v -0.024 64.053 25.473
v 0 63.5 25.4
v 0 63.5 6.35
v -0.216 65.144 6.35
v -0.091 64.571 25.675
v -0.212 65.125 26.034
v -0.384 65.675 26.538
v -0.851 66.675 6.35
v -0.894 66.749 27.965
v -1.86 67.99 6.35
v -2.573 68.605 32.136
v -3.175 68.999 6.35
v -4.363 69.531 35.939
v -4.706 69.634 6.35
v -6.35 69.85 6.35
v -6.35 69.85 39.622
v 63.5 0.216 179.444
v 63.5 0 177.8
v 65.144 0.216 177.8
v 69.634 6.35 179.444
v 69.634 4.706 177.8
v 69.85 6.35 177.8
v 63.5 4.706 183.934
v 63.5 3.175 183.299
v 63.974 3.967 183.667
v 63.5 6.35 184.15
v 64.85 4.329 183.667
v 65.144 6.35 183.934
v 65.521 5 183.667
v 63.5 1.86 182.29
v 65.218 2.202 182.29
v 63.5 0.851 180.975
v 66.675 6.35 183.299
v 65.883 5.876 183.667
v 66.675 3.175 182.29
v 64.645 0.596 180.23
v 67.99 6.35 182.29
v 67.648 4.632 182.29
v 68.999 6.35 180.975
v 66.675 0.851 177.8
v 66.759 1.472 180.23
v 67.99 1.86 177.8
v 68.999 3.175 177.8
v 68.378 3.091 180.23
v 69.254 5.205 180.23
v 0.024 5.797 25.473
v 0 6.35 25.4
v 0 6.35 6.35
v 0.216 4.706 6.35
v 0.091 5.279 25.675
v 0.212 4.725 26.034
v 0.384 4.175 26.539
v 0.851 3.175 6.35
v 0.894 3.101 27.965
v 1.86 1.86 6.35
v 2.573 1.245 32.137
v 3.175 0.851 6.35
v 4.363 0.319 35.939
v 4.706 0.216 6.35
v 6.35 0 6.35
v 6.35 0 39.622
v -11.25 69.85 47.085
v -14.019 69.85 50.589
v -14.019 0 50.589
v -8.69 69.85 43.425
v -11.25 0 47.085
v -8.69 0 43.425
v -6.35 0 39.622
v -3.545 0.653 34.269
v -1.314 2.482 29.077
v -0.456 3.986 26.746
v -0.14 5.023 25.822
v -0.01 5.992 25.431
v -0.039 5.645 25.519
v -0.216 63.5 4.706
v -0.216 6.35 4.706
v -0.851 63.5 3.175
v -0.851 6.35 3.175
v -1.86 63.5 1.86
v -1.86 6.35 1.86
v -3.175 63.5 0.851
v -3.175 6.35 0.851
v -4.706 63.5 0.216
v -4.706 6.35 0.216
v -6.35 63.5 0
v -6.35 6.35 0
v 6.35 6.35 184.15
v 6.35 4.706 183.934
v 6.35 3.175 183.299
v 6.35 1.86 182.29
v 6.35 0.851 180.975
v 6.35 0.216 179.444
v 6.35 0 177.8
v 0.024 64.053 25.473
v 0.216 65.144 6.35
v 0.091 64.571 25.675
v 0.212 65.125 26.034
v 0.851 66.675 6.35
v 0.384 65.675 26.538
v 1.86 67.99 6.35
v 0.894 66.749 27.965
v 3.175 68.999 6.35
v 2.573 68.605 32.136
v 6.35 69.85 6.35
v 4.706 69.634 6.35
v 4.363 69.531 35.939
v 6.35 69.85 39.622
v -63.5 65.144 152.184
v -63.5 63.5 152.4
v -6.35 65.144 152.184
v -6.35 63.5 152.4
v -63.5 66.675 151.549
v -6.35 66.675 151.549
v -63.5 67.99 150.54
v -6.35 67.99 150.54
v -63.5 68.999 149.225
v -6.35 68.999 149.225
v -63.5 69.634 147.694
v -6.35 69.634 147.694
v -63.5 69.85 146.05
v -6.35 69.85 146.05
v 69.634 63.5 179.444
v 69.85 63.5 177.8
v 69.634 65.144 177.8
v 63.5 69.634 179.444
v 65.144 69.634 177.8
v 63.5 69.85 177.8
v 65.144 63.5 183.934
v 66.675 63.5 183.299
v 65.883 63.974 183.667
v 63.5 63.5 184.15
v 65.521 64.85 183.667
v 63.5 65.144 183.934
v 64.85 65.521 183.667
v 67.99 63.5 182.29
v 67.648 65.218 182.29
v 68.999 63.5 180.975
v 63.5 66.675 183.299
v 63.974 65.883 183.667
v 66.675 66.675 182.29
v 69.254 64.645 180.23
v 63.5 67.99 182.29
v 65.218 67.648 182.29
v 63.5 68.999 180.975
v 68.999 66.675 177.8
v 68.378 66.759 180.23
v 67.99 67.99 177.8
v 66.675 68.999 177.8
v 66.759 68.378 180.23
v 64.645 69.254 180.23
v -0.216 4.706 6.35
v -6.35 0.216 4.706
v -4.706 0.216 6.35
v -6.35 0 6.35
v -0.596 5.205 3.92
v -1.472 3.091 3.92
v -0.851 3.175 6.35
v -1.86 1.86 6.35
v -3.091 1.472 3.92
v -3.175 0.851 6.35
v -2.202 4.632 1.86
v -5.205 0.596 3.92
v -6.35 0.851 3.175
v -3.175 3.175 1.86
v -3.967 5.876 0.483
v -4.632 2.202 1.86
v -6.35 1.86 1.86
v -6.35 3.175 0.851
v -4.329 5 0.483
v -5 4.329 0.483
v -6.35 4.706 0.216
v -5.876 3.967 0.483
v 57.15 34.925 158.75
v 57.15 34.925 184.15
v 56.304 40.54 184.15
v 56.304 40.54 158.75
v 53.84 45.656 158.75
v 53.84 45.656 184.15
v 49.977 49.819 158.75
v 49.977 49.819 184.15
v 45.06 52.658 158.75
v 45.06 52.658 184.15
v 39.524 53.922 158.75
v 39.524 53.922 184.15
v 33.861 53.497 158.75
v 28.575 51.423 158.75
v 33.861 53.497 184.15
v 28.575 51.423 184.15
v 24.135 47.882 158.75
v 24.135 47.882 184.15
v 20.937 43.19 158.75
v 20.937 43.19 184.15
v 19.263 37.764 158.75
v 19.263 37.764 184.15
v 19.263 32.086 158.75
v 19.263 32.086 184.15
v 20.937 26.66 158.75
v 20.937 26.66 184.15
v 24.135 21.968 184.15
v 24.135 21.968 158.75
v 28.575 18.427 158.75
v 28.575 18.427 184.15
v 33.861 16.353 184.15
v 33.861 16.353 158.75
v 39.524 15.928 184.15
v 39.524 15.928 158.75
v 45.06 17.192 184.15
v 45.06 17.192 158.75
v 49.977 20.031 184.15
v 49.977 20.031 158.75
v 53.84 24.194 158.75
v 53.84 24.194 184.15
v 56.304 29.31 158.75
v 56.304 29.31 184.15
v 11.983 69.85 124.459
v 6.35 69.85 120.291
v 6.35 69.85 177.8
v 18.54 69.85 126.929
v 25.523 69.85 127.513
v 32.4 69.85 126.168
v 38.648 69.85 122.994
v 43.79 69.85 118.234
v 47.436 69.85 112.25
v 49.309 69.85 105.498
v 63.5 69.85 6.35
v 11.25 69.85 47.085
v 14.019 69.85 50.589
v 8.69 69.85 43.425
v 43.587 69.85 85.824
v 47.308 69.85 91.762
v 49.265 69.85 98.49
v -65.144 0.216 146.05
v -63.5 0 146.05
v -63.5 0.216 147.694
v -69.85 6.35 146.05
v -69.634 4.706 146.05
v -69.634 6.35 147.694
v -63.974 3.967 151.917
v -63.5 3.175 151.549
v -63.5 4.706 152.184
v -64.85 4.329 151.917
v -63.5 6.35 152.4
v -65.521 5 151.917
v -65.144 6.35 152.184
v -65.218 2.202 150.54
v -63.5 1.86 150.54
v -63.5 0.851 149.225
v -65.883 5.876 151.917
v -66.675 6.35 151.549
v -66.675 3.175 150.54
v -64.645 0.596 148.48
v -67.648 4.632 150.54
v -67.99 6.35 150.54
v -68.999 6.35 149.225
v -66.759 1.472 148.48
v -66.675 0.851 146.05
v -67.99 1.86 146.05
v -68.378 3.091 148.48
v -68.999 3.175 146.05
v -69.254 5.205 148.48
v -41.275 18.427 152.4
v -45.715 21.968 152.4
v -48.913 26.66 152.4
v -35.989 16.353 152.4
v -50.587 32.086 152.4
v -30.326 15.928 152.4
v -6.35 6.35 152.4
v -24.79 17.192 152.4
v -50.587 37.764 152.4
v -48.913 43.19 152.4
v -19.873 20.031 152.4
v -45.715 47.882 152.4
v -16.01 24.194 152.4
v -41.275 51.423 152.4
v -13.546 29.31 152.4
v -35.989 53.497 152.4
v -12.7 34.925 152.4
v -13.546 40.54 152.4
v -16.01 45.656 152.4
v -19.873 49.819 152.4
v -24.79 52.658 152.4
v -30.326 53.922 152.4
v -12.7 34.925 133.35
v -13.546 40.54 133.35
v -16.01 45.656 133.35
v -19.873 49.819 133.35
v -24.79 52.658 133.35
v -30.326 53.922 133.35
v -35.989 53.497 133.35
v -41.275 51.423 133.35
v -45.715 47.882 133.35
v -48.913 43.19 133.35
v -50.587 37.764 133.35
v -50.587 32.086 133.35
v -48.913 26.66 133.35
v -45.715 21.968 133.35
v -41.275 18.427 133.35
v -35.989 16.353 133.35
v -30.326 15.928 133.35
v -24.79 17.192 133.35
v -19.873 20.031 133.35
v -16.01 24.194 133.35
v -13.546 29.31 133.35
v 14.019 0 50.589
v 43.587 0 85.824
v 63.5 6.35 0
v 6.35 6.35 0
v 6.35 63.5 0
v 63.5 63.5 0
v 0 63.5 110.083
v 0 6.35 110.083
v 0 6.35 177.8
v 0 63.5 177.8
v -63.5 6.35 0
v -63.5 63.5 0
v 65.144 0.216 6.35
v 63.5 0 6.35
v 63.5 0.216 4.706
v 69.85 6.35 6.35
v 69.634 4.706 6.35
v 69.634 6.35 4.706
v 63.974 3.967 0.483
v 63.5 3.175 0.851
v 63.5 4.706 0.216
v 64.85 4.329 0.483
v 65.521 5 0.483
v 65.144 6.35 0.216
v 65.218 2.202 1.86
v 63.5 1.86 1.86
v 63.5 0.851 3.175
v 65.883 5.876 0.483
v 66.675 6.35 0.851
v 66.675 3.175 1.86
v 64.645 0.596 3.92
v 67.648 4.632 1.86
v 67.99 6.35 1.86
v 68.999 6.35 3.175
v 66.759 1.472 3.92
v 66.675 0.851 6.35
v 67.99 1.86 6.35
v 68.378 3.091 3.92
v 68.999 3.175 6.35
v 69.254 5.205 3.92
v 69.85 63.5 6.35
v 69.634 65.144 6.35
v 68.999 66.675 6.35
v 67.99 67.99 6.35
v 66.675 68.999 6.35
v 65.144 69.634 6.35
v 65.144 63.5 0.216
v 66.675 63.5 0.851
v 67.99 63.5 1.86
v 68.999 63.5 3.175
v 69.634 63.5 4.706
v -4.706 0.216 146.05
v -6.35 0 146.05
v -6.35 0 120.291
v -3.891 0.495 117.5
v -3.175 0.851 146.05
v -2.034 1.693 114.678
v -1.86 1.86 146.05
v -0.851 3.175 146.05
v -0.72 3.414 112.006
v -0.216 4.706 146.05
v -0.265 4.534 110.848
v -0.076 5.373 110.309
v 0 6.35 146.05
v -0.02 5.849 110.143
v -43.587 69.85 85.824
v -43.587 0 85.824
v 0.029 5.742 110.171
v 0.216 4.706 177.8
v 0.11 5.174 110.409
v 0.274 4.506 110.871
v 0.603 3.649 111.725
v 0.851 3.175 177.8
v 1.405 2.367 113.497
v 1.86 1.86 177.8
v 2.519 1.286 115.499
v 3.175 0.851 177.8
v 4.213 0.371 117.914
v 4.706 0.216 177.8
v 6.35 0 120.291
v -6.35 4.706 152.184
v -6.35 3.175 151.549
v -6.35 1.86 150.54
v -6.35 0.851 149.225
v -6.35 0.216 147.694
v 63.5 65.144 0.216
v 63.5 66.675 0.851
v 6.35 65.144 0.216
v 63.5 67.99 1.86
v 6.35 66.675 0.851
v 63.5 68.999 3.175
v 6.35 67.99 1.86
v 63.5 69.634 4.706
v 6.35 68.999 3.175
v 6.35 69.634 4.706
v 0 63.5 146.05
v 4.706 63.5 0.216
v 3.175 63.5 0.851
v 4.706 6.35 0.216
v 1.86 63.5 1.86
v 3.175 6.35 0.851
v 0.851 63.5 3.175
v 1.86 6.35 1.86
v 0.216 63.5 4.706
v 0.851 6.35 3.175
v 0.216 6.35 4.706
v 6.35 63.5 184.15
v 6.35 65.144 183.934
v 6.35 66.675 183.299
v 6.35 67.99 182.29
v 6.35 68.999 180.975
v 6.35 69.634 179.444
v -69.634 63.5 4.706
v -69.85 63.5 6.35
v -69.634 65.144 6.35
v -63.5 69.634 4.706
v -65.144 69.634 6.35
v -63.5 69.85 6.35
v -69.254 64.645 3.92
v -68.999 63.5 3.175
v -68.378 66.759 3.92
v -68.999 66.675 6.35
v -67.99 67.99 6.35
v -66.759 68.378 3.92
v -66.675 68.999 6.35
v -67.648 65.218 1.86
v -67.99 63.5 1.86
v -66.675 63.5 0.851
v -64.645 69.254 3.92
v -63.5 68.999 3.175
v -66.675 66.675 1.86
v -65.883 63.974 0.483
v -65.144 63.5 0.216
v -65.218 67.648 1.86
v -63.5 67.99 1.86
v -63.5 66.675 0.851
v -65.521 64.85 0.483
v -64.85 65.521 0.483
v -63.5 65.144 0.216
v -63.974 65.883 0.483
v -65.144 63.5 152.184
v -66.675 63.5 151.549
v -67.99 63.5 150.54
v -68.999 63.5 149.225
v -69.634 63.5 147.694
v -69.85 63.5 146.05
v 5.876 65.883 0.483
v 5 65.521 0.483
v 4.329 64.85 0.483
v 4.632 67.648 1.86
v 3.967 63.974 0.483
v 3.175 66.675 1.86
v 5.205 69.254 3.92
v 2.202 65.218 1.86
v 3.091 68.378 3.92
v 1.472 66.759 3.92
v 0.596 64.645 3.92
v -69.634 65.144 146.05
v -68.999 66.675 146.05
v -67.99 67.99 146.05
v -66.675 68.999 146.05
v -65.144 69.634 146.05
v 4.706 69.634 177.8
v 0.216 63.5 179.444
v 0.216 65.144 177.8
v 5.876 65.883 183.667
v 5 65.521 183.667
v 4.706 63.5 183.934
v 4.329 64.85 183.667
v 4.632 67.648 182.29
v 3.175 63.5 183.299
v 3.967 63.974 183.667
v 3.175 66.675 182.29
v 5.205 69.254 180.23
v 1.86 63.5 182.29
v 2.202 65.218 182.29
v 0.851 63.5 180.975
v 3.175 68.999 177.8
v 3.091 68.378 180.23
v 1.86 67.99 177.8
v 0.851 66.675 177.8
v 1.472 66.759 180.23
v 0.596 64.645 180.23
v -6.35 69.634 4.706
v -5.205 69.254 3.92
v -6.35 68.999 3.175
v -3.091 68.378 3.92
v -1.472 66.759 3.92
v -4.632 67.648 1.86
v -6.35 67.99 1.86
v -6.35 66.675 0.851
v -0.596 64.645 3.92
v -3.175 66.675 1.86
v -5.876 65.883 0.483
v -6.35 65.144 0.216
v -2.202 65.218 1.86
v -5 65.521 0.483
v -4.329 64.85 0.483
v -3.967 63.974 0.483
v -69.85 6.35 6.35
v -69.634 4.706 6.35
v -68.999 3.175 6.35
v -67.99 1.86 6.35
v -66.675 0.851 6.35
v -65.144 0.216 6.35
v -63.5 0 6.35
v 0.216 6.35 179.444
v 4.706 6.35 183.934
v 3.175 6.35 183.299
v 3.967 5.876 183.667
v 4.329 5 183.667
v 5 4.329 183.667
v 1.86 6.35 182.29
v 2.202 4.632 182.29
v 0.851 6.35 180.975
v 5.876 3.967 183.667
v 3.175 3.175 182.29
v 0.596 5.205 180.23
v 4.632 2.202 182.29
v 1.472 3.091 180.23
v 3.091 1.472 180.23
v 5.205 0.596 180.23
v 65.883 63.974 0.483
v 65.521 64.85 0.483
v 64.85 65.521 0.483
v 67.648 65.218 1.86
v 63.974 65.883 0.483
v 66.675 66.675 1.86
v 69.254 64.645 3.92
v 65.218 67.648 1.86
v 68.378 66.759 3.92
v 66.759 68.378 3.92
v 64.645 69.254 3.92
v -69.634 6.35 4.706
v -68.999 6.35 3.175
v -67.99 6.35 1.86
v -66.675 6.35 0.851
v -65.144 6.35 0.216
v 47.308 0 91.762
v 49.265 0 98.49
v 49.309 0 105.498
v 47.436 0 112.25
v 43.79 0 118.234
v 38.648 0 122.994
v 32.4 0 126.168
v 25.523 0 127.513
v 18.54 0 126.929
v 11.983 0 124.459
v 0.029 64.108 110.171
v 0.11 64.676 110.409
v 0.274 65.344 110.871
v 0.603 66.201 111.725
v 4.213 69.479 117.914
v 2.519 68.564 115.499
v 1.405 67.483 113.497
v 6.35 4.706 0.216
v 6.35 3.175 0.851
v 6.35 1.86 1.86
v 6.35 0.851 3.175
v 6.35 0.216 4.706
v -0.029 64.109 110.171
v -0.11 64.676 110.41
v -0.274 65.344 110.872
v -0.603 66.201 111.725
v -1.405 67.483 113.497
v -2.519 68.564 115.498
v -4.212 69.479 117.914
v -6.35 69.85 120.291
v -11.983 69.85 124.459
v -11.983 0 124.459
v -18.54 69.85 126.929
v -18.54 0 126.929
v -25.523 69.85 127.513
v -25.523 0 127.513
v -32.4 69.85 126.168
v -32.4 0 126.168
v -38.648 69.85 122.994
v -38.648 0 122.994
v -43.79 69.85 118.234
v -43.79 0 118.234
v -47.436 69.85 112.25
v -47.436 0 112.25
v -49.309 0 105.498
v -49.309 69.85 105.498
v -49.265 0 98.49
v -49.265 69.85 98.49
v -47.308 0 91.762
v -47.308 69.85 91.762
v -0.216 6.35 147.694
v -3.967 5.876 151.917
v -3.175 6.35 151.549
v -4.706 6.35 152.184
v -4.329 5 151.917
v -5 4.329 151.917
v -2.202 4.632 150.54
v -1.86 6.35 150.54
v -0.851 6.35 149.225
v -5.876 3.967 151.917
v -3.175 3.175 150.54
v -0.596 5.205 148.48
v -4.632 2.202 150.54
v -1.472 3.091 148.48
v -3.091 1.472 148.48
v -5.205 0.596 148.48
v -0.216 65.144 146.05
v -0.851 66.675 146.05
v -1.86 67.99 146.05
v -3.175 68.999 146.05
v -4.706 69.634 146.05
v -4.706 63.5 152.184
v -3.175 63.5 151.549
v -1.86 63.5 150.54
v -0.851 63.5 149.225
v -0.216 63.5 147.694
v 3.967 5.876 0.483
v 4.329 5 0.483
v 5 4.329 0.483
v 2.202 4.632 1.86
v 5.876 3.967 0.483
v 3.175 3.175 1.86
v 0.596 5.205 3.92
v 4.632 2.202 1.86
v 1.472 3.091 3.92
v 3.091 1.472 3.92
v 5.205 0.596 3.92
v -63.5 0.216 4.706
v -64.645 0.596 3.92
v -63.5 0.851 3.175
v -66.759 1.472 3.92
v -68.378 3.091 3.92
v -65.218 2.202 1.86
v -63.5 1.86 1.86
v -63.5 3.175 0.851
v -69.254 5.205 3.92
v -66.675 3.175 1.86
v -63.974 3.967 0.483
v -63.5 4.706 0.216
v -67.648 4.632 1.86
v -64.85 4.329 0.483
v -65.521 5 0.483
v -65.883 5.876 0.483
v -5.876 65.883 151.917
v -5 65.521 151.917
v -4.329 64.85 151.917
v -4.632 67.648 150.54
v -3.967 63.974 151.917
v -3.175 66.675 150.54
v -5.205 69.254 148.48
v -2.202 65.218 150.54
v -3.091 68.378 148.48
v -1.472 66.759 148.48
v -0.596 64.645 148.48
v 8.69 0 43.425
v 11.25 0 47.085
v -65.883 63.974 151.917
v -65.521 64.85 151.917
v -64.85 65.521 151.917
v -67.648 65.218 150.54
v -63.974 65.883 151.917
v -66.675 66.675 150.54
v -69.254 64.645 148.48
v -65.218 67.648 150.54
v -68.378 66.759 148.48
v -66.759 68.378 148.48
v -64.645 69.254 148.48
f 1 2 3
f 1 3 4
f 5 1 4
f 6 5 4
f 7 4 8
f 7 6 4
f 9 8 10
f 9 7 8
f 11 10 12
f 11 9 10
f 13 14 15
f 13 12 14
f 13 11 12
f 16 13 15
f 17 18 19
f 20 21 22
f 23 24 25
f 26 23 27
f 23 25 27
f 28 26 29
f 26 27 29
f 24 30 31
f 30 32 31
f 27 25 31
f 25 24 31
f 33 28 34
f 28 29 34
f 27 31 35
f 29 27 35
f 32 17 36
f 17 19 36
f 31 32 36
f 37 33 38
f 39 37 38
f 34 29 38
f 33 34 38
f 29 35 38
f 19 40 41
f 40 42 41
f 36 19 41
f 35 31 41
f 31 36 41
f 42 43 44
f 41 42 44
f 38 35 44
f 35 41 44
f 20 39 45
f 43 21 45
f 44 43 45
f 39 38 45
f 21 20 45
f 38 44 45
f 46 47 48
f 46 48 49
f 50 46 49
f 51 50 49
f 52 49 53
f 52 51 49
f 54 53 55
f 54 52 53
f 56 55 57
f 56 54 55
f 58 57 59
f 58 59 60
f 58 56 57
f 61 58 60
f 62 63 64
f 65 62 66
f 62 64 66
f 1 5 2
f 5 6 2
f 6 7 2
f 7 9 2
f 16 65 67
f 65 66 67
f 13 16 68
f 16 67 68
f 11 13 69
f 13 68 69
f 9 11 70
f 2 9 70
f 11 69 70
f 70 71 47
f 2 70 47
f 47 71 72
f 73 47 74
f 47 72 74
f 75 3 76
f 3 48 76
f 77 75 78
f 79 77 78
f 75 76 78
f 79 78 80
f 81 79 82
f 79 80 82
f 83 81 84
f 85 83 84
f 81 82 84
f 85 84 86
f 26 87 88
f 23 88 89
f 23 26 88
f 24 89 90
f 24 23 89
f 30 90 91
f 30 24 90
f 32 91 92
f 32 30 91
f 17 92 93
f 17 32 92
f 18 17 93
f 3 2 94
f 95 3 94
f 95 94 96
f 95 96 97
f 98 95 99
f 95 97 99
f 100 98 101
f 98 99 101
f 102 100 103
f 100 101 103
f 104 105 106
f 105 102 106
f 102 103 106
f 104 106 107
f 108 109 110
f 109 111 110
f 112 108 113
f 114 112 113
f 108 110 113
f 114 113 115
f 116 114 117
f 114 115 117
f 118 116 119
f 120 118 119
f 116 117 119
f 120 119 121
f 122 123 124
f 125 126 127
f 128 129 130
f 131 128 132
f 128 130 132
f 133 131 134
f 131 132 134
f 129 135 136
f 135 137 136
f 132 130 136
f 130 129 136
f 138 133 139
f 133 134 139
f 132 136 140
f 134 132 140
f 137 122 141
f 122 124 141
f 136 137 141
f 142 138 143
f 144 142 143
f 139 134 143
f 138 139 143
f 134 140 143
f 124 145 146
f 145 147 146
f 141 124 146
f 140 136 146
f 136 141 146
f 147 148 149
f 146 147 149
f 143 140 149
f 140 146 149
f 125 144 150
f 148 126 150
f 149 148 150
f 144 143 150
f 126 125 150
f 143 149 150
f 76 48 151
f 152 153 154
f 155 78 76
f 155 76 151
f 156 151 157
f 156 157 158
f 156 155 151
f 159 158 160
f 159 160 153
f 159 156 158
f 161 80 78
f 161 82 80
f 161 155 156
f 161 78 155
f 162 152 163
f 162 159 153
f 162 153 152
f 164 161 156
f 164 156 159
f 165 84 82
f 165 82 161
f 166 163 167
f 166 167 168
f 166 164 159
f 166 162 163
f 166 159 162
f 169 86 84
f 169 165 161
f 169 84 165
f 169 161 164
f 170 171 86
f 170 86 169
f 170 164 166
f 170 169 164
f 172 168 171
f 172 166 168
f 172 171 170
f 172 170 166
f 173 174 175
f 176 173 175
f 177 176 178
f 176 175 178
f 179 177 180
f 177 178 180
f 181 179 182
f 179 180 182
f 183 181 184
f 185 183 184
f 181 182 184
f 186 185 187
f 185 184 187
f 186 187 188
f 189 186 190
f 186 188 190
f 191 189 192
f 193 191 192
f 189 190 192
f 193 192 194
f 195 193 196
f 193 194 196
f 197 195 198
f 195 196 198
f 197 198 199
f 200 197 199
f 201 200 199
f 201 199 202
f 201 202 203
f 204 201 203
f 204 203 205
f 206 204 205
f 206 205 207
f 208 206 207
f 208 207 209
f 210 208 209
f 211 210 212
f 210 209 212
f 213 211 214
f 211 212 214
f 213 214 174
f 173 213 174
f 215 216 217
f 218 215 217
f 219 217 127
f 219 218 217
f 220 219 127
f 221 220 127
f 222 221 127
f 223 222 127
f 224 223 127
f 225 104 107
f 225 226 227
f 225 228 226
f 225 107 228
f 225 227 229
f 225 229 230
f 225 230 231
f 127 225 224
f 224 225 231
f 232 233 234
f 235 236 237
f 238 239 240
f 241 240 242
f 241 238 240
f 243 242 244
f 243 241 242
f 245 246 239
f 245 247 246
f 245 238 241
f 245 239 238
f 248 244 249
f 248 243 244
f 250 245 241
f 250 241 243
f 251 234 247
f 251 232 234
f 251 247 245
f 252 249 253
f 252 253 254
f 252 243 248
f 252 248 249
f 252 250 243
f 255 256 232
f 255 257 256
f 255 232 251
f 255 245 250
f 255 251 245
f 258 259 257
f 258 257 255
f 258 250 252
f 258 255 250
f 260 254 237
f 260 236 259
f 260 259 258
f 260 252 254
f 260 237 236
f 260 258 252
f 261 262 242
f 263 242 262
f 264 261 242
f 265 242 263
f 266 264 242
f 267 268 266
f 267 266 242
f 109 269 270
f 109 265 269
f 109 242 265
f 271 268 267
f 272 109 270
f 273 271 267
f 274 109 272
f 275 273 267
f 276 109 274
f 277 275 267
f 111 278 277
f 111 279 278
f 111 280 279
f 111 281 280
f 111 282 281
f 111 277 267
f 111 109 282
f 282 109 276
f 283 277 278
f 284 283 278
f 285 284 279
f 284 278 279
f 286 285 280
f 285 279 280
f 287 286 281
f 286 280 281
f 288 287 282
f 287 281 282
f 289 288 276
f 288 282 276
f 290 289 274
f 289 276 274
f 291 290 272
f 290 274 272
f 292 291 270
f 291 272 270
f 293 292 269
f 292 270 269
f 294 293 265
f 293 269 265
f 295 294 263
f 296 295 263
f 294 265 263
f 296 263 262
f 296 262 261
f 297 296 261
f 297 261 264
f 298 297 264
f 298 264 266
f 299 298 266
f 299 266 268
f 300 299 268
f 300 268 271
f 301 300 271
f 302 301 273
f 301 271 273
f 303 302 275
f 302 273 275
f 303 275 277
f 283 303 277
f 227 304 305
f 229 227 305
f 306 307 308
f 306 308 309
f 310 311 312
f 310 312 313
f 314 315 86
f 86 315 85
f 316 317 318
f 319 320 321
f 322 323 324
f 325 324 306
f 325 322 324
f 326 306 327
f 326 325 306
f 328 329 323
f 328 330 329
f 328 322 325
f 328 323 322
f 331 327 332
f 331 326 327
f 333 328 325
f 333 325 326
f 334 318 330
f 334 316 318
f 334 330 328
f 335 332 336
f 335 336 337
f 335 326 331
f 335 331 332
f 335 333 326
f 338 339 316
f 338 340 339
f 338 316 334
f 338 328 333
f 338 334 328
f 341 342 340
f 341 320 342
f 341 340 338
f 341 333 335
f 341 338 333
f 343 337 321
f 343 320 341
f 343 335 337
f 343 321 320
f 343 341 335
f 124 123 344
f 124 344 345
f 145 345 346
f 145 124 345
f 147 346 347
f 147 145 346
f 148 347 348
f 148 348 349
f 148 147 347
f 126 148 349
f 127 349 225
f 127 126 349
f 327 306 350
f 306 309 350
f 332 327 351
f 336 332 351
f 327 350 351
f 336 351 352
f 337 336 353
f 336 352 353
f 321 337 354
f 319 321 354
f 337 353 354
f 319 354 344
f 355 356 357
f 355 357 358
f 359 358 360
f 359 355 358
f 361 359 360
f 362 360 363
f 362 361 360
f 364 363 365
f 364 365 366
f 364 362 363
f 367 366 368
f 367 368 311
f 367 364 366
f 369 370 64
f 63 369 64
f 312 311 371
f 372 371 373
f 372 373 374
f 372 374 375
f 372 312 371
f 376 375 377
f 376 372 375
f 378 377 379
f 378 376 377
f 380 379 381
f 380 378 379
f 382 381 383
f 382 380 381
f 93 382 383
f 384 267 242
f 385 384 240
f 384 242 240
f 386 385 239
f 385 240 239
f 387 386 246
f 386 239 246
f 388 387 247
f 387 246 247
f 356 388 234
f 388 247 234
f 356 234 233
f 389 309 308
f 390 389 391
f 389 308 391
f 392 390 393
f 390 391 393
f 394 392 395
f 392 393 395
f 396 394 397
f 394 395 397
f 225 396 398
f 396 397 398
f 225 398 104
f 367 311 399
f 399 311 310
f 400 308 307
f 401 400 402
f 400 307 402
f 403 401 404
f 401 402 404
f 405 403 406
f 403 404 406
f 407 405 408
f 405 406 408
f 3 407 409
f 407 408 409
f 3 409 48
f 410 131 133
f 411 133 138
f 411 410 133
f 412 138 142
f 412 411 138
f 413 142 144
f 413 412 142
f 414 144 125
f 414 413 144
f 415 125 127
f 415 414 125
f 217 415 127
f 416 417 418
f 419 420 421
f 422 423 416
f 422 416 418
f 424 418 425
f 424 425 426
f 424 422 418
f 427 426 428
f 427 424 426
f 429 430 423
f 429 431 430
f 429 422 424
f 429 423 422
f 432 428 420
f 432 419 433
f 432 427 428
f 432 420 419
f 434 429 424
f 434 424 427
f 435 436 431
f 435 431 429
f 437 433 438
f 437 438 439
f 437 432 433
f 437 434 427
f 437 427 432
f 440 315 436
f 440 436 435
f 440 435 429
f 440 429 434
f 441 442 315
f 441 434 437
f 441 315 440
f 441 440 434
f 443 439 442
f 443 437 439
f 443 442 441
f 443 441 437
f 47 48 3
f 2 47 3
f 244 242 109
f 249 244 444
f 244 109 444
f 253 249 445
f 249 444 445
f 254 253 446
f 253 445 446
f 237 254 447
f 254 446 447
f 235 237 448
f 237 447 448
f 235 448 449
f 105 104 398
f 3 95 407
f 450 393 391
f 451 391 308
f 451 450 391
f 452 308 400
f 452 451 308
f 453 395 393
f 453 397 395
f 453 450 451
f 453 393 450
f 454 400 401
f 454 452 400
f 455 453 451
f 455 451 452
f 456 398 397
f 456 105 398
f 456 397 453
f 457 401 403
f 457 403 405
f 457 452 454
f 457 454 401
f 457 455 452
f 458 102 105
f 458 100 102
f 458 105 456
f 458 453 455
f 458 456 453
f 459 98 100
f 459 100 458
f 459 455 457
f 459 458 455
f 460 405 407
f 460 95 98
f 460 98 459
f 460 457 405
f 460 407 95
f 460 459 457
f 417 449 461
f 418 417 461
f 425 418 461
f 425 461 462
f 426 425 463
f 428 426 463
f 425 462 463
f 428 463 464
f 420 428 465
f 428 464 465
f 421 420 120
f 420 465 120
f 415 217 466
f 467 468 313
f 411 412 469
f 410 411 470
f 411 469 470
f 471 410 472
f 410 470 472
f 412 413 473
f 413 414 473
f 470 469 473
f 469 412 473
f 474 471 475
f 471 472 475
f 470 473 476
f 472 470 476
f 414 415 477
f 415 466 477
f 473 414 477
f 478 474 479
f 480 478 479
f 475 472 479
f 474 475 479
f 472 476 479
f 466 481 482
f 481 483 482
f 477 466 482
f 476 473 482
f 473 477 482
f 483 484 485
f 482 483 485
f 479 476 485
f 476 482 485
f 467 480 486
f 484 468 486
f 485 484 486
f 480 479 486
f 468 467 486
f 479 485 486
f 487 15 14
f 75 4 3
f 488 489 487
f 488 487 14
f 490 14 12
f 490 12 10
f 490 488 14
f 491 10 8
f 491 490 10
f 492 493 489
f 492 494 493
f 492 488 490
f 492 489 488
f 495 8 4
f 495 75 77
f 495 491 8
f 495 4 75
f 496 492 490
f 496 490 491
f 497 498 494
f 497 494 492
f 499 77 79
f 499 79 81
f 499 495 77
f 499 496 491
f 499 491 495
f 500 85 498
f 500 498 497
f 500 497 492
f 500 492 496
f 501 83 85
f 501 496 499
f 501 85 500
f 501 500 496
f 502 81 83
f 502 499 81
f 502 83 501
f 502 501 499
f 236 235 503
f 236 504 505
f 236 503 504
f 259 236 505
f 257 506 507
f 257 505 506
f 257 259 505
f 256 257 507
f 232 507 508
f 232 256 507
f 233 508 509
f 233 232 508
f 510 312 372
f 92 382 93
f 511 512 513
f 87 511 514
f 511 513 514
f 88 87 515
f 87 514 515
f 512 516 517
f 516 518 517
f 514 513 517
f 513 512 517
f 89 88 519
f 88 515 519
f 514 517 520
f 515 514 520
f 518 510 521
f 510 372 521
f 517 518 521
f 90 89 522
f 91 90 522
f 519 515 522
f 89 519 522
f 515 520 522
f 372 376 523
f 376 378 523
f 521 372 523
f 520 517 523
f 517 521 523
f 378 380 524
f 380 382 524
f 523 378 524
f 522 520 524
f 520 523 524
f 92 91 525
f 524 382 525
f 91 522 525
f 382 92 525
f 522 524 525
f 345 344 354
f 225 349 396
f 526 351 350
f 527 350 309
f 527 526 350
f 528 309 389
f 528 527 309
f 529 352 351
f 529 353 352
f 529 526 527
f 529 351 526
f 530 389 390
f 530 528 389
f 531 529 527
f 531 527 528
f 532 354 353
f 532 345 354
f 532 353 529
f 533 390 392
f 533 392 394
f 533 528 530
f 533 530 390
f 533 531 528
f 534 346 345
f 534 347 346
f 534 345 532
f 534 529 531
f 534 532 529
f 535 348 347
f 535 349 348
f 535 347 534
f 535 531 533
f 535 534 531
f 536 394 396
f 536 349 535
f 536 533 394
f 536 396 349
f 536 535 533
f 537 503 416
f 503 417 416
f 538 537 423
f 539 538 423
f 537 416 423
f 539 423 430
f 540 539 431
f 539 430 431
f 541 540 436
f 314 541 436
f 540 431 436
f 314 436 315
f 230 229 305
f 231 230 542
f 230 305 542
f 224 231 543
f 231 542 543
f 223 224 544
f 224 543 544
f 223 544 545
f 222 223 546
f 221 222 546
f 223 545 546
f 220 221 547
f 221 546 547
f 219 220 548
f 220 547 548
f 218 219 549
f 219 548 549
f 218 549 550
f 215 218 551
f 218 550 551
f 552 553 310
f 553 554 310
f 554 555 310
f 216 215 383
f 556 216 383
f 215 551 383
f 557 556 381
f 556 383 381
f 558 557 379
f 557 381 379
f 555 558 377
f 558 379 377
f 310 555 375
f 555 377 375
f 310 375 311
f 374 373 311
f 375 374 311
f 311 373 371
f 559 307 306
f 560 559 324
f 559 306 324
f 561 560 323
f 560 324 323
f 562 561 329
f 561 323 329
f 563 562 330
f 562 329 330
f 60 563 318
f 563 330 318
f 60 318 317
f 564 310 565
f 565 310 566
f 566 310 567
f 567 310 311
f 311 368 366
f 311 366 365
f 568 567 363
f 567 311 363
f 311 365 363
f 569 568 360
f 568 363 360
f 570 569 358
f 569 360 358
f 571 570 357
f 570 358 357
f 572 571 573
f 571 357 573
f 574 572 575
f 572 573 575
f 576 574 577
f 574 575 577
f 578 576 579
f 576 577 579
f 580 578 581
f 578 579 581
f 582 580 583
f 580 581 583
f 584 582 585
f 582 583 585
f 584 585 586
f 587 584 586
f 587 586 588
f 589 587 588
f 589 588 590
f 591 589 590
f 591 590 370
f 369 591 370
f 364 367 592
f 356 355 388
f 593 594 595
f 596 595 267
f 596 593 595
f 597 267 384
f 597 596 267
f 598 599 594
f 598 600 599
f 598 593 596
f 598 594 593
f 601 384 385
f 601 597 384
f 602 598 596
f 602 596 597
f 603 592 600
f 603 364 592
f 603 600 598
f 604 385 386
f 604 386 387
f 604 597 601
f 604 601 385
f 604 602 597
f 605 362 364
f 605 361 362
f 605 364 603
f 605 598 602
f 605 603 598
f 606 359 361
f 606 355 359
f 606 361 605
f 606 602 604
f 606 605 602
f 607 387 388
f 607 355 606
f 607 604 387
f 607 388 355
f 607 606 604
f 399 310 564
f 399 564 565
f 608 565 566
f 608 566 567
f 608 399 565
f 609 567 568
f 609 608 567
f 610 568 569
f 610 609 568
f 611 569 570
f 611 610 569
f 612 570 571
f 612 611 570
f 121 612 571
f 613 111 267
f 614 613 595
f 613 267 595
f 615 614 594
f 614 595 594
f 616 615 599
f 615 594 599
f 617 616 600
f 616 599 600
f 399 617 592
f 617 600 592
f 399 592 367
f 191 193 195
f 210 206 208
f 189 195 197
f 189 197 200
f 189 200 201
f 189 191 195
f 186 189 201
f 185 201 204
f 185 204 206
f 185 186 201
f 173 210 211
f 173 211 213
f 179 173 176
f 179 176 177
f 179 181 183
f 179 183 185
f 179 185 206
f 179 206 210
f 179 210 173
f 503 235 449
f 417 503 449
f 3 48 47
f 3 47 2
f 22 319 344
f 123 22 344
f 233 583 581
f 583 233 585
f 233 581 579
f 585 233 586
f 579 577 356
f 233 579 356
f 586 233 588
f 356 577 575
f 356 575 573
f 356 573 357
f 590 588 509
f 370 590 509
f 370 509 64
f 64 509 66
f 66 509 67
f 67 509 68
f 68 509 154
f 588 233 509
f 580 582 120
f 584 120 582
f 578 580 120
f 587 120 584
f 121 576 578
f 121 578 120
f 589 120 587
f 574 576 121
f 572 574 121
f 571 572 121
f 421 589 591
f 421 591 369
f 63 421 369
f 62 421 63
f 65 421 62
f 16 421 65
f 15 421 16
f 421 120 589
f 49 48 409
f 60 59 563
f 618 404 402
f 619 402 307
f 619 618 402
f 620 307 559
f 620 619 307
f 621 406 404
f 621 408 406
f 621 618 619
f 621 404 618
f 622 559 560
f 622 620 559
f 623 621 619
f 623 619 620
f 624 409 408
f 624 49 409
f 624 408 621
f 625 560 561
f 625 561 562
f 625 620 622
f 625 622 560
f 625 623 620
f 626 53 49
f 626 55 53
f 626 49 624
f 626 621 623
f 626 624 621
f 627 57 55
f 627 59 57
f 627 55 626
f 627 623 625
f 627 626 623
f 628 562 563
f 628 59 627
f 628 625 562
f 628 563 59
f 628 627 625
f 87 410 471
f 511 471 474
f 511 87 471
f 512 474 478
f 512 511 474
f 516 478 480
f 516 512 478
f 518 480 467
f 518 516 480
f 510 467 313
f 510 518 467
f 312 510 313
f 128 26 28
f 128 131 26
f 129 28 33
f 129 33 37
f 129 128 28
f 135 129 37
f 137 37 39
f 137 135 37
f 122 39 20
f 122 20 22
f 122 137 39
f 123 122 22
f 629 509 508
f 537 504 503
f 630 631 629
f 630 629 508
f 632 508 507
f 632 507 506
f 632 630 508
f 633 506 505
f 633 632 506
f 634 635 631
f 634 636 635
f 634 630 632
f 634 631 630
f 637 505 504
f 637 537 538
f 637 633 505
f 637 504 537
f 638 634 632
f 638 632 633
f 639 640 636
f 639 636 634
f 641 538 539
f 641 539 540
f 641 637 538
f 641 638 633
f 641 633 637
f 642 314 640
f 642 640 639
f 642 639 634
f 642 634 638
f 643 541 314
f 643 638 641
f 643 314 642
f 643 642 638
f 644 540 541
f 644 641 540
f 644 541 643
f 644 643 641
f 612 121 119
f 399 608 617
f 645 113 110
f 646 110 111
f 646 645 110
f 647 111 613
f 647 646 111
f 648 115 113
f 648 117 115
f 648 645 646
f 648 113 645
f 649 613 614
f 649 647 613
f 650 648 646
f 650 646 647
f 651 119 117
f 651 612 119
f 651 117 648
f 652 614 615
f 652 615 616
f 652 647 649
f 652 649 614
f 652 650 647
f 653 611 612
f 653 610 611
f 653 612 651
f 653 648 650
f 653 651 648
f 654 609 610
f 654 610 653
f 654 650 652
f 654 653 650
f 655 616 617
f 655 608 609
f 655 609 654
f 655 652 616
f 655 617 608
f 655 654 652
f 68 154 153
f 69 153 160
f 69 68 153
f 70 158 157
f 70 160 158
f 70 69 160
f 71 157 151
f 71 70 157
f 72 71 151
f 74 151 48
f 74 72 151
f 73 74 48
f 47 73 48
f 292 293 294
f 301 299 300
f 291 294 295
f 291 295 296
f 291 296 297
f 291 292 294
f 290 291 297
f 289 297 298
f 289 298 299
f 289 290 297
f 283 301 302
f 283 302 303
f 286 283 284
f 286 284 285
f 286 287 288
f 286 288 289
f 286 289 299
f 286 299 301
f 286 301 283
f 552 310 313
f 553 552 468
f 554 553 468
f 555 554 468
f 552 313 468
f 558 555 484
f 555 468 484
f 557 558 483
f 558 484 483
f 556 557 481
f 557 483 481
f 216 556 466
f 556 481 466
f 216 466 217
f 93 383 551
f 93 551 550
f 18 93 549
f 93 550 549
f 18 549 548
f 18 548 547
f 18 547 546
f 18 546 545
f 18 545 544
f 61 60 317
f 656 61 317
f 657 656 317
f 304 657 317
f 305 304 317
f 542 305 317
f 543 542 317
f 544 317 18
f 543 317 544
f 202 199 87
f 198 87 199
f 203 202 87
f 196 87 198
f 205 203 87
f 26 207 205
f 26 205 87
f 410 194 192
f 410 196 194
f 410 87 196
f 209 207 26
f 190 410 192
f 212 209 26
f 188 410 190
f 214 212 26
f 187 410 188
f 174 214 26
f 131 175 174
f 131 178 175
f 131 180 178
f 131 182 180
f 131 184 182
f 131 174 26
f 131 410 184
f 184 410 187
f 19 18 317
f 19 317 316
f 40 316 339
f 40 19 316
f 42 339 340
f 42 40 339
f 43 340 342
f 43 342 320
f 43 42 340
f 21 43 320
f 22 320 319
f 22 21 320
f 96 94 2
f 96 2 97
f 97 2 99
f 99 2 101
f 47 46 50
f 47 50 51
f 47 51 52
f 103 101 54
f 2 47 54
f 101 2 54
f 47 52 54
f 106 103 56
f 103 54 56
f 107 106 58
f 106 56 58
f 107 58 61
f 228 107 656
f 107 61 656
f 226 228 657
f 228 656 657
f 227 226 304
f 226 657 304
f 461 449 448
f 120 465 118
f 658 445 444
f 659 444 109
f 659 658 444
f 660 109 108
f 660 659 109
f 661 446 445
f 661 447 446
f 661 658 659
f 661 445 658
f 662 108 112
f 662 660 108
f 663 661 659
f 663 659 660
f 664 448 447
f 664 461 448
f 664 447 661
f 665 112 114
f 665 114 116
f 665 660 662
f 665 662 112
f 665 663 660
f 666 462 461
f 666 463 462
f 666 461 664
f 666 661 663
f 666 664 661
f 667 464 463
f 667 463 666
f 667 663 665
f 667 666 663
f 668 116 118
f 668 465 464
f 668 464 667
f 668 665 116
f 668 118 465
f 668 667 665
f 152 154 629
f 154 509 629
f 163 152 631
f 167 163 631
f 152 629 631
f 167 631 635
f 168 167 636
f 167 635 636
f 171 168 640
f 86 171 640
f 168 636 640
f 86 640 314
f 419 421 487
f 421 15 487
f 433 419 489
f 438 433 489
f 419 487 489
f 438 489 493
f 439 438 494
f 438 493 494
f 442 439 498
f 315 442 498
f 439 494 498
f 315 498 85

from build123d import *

# Parameters (mm, degrees)
F0_W      = 69.85
F0_H      = 69.85
F1_DEPTH  = 184.15
F2_R      = 6.35
F3_R      = 6.35
F4_W      = 69.85
F4_H      = 69.85
F5_DEPTH  = 152.4
F6_R      = 6.35
F7_R      = 6.35
F8_R      = 19.05
F9_DEPTH  = 25.4
F11_DEPTH = 76.2
F12_R     = 19.05
F13_DEPTH = 19.05


with BuildPart() as f1:
    # F0 (on Top) → F1 (new body)
    with BuildSketch(Plane.XY):
        with Locations((34.925, 34.925)):
            Rectangle(F0_W, F0_H)
    extrude(amount=F1_DEPTH)

    # F2
    f2_edges = [f1.edges().sort_by_distance(p)[0] for p in [
        (0, 69.85, 92.075),
        (0, 0, 92.075),
        (69.85, 0, 92.075),
        (69.85, 69.85, 92.075),
    ]]
    fillet(f2_edges, radius=F2_R)

    # F3
    f3_edges = [f1.edges().sort_by_distance(p)[0] for p in [
        (69.85, 34.925, 184.15),
        (69.85, 34.925, 0),
        (69.85, 6.35, 92.075),
        (69.85, 63.5, 92.075),
    ]]
    fillet(f3_edges, radius=F3_R)

    # F8 (on face) → F9 (cut)
    with BuildSketch(Plane.XY.offset(184.15)):
        with Locations((38.1, 34.925)):
            Circle(F8_R)
    extrude(amount=-F9_DEPTH, mode=Mode.SUBTRACT)


with BuildPart() as f5:
    # F4 (on Top) → F5 (new body)
    with BuildSketch(Plane.XY):
        with Locations((-34.925, 34.925)):
            Rectangle(F4_W, F4_H)
    extrude(amount=F5_DEPTH)

    # F6
    f6_edges = [f5.edges().sort_by_distance(p)[0] for p in [
        (0, 0, 76.2),
        (-69.85, 0, 76.2),
        (-69.85, 69.85, 76.2),
        (0, 69.85, 76.2),
    ]]
    fillet(f6_edges, radius=F6_R)

    # F7
    f7_edges = [f5.edges().sort_by_distance(p)[0] for p in [
        (-34.925, 69.85, 152.4),
        (-69.85, 34.925, 0),
        (-69.85, 63.5, 76.2),
        (-69.85, 6.35, 76.2),
        (-69.85, 34.925, 152.4),
    ]]
    fillet(f7_edges, radius=F7_R)


with BuildPart() as f11_tool:
    # F10 (on face) → F11 (new body)
    with BuildSketch(Plane.XZ):
        with BuildLine():
            Line((14.01906, 50.588936), (43.58698, 85.824204))
            ThreePointArc((43.58698, 85.824204), (36.482299, 124.345823), (0, 110.082811))
            ThreePointArc((0, 110.082811), (-36.482299, 124.345823), (-43.58698, 85.824204))
            Line((-43.58698, 85.824204), (-14.01906, 50.588936))
            ThreePointArc((-14.01906, 50.588936), (-5.807521, 38.663454), (0, 25.4))
            ThreePointArc((0, 25.4), (5.807521, 38.663454), (14.01906, 50.588936))
        make_face()
    extrude(amount=-F11_DEPTH)


with BuildPart() as f1_1:
    add(f1.part)

    # F11: cut by f11_tool
    add(f11_tool.part, mode=Mode.SUBTRACT)


with BuildPart() as f5_1:
    add(f5.part)

    # F11: cut by f11_tool
    add(f11_tool.part, mode=Mode.SUBTRACT)

    # F12 (on face) → F13 (cut)
    with BuildSketch(Plane.XY.offset(152.4)):
        with Locations((-31.75, 34.925)):
            Circle(F12_R)
    extrude(amount=-F13_DEPTH, mode=Mode.SUBTRACT)


solid = Compound([f1_1.part, f5_1.part])
